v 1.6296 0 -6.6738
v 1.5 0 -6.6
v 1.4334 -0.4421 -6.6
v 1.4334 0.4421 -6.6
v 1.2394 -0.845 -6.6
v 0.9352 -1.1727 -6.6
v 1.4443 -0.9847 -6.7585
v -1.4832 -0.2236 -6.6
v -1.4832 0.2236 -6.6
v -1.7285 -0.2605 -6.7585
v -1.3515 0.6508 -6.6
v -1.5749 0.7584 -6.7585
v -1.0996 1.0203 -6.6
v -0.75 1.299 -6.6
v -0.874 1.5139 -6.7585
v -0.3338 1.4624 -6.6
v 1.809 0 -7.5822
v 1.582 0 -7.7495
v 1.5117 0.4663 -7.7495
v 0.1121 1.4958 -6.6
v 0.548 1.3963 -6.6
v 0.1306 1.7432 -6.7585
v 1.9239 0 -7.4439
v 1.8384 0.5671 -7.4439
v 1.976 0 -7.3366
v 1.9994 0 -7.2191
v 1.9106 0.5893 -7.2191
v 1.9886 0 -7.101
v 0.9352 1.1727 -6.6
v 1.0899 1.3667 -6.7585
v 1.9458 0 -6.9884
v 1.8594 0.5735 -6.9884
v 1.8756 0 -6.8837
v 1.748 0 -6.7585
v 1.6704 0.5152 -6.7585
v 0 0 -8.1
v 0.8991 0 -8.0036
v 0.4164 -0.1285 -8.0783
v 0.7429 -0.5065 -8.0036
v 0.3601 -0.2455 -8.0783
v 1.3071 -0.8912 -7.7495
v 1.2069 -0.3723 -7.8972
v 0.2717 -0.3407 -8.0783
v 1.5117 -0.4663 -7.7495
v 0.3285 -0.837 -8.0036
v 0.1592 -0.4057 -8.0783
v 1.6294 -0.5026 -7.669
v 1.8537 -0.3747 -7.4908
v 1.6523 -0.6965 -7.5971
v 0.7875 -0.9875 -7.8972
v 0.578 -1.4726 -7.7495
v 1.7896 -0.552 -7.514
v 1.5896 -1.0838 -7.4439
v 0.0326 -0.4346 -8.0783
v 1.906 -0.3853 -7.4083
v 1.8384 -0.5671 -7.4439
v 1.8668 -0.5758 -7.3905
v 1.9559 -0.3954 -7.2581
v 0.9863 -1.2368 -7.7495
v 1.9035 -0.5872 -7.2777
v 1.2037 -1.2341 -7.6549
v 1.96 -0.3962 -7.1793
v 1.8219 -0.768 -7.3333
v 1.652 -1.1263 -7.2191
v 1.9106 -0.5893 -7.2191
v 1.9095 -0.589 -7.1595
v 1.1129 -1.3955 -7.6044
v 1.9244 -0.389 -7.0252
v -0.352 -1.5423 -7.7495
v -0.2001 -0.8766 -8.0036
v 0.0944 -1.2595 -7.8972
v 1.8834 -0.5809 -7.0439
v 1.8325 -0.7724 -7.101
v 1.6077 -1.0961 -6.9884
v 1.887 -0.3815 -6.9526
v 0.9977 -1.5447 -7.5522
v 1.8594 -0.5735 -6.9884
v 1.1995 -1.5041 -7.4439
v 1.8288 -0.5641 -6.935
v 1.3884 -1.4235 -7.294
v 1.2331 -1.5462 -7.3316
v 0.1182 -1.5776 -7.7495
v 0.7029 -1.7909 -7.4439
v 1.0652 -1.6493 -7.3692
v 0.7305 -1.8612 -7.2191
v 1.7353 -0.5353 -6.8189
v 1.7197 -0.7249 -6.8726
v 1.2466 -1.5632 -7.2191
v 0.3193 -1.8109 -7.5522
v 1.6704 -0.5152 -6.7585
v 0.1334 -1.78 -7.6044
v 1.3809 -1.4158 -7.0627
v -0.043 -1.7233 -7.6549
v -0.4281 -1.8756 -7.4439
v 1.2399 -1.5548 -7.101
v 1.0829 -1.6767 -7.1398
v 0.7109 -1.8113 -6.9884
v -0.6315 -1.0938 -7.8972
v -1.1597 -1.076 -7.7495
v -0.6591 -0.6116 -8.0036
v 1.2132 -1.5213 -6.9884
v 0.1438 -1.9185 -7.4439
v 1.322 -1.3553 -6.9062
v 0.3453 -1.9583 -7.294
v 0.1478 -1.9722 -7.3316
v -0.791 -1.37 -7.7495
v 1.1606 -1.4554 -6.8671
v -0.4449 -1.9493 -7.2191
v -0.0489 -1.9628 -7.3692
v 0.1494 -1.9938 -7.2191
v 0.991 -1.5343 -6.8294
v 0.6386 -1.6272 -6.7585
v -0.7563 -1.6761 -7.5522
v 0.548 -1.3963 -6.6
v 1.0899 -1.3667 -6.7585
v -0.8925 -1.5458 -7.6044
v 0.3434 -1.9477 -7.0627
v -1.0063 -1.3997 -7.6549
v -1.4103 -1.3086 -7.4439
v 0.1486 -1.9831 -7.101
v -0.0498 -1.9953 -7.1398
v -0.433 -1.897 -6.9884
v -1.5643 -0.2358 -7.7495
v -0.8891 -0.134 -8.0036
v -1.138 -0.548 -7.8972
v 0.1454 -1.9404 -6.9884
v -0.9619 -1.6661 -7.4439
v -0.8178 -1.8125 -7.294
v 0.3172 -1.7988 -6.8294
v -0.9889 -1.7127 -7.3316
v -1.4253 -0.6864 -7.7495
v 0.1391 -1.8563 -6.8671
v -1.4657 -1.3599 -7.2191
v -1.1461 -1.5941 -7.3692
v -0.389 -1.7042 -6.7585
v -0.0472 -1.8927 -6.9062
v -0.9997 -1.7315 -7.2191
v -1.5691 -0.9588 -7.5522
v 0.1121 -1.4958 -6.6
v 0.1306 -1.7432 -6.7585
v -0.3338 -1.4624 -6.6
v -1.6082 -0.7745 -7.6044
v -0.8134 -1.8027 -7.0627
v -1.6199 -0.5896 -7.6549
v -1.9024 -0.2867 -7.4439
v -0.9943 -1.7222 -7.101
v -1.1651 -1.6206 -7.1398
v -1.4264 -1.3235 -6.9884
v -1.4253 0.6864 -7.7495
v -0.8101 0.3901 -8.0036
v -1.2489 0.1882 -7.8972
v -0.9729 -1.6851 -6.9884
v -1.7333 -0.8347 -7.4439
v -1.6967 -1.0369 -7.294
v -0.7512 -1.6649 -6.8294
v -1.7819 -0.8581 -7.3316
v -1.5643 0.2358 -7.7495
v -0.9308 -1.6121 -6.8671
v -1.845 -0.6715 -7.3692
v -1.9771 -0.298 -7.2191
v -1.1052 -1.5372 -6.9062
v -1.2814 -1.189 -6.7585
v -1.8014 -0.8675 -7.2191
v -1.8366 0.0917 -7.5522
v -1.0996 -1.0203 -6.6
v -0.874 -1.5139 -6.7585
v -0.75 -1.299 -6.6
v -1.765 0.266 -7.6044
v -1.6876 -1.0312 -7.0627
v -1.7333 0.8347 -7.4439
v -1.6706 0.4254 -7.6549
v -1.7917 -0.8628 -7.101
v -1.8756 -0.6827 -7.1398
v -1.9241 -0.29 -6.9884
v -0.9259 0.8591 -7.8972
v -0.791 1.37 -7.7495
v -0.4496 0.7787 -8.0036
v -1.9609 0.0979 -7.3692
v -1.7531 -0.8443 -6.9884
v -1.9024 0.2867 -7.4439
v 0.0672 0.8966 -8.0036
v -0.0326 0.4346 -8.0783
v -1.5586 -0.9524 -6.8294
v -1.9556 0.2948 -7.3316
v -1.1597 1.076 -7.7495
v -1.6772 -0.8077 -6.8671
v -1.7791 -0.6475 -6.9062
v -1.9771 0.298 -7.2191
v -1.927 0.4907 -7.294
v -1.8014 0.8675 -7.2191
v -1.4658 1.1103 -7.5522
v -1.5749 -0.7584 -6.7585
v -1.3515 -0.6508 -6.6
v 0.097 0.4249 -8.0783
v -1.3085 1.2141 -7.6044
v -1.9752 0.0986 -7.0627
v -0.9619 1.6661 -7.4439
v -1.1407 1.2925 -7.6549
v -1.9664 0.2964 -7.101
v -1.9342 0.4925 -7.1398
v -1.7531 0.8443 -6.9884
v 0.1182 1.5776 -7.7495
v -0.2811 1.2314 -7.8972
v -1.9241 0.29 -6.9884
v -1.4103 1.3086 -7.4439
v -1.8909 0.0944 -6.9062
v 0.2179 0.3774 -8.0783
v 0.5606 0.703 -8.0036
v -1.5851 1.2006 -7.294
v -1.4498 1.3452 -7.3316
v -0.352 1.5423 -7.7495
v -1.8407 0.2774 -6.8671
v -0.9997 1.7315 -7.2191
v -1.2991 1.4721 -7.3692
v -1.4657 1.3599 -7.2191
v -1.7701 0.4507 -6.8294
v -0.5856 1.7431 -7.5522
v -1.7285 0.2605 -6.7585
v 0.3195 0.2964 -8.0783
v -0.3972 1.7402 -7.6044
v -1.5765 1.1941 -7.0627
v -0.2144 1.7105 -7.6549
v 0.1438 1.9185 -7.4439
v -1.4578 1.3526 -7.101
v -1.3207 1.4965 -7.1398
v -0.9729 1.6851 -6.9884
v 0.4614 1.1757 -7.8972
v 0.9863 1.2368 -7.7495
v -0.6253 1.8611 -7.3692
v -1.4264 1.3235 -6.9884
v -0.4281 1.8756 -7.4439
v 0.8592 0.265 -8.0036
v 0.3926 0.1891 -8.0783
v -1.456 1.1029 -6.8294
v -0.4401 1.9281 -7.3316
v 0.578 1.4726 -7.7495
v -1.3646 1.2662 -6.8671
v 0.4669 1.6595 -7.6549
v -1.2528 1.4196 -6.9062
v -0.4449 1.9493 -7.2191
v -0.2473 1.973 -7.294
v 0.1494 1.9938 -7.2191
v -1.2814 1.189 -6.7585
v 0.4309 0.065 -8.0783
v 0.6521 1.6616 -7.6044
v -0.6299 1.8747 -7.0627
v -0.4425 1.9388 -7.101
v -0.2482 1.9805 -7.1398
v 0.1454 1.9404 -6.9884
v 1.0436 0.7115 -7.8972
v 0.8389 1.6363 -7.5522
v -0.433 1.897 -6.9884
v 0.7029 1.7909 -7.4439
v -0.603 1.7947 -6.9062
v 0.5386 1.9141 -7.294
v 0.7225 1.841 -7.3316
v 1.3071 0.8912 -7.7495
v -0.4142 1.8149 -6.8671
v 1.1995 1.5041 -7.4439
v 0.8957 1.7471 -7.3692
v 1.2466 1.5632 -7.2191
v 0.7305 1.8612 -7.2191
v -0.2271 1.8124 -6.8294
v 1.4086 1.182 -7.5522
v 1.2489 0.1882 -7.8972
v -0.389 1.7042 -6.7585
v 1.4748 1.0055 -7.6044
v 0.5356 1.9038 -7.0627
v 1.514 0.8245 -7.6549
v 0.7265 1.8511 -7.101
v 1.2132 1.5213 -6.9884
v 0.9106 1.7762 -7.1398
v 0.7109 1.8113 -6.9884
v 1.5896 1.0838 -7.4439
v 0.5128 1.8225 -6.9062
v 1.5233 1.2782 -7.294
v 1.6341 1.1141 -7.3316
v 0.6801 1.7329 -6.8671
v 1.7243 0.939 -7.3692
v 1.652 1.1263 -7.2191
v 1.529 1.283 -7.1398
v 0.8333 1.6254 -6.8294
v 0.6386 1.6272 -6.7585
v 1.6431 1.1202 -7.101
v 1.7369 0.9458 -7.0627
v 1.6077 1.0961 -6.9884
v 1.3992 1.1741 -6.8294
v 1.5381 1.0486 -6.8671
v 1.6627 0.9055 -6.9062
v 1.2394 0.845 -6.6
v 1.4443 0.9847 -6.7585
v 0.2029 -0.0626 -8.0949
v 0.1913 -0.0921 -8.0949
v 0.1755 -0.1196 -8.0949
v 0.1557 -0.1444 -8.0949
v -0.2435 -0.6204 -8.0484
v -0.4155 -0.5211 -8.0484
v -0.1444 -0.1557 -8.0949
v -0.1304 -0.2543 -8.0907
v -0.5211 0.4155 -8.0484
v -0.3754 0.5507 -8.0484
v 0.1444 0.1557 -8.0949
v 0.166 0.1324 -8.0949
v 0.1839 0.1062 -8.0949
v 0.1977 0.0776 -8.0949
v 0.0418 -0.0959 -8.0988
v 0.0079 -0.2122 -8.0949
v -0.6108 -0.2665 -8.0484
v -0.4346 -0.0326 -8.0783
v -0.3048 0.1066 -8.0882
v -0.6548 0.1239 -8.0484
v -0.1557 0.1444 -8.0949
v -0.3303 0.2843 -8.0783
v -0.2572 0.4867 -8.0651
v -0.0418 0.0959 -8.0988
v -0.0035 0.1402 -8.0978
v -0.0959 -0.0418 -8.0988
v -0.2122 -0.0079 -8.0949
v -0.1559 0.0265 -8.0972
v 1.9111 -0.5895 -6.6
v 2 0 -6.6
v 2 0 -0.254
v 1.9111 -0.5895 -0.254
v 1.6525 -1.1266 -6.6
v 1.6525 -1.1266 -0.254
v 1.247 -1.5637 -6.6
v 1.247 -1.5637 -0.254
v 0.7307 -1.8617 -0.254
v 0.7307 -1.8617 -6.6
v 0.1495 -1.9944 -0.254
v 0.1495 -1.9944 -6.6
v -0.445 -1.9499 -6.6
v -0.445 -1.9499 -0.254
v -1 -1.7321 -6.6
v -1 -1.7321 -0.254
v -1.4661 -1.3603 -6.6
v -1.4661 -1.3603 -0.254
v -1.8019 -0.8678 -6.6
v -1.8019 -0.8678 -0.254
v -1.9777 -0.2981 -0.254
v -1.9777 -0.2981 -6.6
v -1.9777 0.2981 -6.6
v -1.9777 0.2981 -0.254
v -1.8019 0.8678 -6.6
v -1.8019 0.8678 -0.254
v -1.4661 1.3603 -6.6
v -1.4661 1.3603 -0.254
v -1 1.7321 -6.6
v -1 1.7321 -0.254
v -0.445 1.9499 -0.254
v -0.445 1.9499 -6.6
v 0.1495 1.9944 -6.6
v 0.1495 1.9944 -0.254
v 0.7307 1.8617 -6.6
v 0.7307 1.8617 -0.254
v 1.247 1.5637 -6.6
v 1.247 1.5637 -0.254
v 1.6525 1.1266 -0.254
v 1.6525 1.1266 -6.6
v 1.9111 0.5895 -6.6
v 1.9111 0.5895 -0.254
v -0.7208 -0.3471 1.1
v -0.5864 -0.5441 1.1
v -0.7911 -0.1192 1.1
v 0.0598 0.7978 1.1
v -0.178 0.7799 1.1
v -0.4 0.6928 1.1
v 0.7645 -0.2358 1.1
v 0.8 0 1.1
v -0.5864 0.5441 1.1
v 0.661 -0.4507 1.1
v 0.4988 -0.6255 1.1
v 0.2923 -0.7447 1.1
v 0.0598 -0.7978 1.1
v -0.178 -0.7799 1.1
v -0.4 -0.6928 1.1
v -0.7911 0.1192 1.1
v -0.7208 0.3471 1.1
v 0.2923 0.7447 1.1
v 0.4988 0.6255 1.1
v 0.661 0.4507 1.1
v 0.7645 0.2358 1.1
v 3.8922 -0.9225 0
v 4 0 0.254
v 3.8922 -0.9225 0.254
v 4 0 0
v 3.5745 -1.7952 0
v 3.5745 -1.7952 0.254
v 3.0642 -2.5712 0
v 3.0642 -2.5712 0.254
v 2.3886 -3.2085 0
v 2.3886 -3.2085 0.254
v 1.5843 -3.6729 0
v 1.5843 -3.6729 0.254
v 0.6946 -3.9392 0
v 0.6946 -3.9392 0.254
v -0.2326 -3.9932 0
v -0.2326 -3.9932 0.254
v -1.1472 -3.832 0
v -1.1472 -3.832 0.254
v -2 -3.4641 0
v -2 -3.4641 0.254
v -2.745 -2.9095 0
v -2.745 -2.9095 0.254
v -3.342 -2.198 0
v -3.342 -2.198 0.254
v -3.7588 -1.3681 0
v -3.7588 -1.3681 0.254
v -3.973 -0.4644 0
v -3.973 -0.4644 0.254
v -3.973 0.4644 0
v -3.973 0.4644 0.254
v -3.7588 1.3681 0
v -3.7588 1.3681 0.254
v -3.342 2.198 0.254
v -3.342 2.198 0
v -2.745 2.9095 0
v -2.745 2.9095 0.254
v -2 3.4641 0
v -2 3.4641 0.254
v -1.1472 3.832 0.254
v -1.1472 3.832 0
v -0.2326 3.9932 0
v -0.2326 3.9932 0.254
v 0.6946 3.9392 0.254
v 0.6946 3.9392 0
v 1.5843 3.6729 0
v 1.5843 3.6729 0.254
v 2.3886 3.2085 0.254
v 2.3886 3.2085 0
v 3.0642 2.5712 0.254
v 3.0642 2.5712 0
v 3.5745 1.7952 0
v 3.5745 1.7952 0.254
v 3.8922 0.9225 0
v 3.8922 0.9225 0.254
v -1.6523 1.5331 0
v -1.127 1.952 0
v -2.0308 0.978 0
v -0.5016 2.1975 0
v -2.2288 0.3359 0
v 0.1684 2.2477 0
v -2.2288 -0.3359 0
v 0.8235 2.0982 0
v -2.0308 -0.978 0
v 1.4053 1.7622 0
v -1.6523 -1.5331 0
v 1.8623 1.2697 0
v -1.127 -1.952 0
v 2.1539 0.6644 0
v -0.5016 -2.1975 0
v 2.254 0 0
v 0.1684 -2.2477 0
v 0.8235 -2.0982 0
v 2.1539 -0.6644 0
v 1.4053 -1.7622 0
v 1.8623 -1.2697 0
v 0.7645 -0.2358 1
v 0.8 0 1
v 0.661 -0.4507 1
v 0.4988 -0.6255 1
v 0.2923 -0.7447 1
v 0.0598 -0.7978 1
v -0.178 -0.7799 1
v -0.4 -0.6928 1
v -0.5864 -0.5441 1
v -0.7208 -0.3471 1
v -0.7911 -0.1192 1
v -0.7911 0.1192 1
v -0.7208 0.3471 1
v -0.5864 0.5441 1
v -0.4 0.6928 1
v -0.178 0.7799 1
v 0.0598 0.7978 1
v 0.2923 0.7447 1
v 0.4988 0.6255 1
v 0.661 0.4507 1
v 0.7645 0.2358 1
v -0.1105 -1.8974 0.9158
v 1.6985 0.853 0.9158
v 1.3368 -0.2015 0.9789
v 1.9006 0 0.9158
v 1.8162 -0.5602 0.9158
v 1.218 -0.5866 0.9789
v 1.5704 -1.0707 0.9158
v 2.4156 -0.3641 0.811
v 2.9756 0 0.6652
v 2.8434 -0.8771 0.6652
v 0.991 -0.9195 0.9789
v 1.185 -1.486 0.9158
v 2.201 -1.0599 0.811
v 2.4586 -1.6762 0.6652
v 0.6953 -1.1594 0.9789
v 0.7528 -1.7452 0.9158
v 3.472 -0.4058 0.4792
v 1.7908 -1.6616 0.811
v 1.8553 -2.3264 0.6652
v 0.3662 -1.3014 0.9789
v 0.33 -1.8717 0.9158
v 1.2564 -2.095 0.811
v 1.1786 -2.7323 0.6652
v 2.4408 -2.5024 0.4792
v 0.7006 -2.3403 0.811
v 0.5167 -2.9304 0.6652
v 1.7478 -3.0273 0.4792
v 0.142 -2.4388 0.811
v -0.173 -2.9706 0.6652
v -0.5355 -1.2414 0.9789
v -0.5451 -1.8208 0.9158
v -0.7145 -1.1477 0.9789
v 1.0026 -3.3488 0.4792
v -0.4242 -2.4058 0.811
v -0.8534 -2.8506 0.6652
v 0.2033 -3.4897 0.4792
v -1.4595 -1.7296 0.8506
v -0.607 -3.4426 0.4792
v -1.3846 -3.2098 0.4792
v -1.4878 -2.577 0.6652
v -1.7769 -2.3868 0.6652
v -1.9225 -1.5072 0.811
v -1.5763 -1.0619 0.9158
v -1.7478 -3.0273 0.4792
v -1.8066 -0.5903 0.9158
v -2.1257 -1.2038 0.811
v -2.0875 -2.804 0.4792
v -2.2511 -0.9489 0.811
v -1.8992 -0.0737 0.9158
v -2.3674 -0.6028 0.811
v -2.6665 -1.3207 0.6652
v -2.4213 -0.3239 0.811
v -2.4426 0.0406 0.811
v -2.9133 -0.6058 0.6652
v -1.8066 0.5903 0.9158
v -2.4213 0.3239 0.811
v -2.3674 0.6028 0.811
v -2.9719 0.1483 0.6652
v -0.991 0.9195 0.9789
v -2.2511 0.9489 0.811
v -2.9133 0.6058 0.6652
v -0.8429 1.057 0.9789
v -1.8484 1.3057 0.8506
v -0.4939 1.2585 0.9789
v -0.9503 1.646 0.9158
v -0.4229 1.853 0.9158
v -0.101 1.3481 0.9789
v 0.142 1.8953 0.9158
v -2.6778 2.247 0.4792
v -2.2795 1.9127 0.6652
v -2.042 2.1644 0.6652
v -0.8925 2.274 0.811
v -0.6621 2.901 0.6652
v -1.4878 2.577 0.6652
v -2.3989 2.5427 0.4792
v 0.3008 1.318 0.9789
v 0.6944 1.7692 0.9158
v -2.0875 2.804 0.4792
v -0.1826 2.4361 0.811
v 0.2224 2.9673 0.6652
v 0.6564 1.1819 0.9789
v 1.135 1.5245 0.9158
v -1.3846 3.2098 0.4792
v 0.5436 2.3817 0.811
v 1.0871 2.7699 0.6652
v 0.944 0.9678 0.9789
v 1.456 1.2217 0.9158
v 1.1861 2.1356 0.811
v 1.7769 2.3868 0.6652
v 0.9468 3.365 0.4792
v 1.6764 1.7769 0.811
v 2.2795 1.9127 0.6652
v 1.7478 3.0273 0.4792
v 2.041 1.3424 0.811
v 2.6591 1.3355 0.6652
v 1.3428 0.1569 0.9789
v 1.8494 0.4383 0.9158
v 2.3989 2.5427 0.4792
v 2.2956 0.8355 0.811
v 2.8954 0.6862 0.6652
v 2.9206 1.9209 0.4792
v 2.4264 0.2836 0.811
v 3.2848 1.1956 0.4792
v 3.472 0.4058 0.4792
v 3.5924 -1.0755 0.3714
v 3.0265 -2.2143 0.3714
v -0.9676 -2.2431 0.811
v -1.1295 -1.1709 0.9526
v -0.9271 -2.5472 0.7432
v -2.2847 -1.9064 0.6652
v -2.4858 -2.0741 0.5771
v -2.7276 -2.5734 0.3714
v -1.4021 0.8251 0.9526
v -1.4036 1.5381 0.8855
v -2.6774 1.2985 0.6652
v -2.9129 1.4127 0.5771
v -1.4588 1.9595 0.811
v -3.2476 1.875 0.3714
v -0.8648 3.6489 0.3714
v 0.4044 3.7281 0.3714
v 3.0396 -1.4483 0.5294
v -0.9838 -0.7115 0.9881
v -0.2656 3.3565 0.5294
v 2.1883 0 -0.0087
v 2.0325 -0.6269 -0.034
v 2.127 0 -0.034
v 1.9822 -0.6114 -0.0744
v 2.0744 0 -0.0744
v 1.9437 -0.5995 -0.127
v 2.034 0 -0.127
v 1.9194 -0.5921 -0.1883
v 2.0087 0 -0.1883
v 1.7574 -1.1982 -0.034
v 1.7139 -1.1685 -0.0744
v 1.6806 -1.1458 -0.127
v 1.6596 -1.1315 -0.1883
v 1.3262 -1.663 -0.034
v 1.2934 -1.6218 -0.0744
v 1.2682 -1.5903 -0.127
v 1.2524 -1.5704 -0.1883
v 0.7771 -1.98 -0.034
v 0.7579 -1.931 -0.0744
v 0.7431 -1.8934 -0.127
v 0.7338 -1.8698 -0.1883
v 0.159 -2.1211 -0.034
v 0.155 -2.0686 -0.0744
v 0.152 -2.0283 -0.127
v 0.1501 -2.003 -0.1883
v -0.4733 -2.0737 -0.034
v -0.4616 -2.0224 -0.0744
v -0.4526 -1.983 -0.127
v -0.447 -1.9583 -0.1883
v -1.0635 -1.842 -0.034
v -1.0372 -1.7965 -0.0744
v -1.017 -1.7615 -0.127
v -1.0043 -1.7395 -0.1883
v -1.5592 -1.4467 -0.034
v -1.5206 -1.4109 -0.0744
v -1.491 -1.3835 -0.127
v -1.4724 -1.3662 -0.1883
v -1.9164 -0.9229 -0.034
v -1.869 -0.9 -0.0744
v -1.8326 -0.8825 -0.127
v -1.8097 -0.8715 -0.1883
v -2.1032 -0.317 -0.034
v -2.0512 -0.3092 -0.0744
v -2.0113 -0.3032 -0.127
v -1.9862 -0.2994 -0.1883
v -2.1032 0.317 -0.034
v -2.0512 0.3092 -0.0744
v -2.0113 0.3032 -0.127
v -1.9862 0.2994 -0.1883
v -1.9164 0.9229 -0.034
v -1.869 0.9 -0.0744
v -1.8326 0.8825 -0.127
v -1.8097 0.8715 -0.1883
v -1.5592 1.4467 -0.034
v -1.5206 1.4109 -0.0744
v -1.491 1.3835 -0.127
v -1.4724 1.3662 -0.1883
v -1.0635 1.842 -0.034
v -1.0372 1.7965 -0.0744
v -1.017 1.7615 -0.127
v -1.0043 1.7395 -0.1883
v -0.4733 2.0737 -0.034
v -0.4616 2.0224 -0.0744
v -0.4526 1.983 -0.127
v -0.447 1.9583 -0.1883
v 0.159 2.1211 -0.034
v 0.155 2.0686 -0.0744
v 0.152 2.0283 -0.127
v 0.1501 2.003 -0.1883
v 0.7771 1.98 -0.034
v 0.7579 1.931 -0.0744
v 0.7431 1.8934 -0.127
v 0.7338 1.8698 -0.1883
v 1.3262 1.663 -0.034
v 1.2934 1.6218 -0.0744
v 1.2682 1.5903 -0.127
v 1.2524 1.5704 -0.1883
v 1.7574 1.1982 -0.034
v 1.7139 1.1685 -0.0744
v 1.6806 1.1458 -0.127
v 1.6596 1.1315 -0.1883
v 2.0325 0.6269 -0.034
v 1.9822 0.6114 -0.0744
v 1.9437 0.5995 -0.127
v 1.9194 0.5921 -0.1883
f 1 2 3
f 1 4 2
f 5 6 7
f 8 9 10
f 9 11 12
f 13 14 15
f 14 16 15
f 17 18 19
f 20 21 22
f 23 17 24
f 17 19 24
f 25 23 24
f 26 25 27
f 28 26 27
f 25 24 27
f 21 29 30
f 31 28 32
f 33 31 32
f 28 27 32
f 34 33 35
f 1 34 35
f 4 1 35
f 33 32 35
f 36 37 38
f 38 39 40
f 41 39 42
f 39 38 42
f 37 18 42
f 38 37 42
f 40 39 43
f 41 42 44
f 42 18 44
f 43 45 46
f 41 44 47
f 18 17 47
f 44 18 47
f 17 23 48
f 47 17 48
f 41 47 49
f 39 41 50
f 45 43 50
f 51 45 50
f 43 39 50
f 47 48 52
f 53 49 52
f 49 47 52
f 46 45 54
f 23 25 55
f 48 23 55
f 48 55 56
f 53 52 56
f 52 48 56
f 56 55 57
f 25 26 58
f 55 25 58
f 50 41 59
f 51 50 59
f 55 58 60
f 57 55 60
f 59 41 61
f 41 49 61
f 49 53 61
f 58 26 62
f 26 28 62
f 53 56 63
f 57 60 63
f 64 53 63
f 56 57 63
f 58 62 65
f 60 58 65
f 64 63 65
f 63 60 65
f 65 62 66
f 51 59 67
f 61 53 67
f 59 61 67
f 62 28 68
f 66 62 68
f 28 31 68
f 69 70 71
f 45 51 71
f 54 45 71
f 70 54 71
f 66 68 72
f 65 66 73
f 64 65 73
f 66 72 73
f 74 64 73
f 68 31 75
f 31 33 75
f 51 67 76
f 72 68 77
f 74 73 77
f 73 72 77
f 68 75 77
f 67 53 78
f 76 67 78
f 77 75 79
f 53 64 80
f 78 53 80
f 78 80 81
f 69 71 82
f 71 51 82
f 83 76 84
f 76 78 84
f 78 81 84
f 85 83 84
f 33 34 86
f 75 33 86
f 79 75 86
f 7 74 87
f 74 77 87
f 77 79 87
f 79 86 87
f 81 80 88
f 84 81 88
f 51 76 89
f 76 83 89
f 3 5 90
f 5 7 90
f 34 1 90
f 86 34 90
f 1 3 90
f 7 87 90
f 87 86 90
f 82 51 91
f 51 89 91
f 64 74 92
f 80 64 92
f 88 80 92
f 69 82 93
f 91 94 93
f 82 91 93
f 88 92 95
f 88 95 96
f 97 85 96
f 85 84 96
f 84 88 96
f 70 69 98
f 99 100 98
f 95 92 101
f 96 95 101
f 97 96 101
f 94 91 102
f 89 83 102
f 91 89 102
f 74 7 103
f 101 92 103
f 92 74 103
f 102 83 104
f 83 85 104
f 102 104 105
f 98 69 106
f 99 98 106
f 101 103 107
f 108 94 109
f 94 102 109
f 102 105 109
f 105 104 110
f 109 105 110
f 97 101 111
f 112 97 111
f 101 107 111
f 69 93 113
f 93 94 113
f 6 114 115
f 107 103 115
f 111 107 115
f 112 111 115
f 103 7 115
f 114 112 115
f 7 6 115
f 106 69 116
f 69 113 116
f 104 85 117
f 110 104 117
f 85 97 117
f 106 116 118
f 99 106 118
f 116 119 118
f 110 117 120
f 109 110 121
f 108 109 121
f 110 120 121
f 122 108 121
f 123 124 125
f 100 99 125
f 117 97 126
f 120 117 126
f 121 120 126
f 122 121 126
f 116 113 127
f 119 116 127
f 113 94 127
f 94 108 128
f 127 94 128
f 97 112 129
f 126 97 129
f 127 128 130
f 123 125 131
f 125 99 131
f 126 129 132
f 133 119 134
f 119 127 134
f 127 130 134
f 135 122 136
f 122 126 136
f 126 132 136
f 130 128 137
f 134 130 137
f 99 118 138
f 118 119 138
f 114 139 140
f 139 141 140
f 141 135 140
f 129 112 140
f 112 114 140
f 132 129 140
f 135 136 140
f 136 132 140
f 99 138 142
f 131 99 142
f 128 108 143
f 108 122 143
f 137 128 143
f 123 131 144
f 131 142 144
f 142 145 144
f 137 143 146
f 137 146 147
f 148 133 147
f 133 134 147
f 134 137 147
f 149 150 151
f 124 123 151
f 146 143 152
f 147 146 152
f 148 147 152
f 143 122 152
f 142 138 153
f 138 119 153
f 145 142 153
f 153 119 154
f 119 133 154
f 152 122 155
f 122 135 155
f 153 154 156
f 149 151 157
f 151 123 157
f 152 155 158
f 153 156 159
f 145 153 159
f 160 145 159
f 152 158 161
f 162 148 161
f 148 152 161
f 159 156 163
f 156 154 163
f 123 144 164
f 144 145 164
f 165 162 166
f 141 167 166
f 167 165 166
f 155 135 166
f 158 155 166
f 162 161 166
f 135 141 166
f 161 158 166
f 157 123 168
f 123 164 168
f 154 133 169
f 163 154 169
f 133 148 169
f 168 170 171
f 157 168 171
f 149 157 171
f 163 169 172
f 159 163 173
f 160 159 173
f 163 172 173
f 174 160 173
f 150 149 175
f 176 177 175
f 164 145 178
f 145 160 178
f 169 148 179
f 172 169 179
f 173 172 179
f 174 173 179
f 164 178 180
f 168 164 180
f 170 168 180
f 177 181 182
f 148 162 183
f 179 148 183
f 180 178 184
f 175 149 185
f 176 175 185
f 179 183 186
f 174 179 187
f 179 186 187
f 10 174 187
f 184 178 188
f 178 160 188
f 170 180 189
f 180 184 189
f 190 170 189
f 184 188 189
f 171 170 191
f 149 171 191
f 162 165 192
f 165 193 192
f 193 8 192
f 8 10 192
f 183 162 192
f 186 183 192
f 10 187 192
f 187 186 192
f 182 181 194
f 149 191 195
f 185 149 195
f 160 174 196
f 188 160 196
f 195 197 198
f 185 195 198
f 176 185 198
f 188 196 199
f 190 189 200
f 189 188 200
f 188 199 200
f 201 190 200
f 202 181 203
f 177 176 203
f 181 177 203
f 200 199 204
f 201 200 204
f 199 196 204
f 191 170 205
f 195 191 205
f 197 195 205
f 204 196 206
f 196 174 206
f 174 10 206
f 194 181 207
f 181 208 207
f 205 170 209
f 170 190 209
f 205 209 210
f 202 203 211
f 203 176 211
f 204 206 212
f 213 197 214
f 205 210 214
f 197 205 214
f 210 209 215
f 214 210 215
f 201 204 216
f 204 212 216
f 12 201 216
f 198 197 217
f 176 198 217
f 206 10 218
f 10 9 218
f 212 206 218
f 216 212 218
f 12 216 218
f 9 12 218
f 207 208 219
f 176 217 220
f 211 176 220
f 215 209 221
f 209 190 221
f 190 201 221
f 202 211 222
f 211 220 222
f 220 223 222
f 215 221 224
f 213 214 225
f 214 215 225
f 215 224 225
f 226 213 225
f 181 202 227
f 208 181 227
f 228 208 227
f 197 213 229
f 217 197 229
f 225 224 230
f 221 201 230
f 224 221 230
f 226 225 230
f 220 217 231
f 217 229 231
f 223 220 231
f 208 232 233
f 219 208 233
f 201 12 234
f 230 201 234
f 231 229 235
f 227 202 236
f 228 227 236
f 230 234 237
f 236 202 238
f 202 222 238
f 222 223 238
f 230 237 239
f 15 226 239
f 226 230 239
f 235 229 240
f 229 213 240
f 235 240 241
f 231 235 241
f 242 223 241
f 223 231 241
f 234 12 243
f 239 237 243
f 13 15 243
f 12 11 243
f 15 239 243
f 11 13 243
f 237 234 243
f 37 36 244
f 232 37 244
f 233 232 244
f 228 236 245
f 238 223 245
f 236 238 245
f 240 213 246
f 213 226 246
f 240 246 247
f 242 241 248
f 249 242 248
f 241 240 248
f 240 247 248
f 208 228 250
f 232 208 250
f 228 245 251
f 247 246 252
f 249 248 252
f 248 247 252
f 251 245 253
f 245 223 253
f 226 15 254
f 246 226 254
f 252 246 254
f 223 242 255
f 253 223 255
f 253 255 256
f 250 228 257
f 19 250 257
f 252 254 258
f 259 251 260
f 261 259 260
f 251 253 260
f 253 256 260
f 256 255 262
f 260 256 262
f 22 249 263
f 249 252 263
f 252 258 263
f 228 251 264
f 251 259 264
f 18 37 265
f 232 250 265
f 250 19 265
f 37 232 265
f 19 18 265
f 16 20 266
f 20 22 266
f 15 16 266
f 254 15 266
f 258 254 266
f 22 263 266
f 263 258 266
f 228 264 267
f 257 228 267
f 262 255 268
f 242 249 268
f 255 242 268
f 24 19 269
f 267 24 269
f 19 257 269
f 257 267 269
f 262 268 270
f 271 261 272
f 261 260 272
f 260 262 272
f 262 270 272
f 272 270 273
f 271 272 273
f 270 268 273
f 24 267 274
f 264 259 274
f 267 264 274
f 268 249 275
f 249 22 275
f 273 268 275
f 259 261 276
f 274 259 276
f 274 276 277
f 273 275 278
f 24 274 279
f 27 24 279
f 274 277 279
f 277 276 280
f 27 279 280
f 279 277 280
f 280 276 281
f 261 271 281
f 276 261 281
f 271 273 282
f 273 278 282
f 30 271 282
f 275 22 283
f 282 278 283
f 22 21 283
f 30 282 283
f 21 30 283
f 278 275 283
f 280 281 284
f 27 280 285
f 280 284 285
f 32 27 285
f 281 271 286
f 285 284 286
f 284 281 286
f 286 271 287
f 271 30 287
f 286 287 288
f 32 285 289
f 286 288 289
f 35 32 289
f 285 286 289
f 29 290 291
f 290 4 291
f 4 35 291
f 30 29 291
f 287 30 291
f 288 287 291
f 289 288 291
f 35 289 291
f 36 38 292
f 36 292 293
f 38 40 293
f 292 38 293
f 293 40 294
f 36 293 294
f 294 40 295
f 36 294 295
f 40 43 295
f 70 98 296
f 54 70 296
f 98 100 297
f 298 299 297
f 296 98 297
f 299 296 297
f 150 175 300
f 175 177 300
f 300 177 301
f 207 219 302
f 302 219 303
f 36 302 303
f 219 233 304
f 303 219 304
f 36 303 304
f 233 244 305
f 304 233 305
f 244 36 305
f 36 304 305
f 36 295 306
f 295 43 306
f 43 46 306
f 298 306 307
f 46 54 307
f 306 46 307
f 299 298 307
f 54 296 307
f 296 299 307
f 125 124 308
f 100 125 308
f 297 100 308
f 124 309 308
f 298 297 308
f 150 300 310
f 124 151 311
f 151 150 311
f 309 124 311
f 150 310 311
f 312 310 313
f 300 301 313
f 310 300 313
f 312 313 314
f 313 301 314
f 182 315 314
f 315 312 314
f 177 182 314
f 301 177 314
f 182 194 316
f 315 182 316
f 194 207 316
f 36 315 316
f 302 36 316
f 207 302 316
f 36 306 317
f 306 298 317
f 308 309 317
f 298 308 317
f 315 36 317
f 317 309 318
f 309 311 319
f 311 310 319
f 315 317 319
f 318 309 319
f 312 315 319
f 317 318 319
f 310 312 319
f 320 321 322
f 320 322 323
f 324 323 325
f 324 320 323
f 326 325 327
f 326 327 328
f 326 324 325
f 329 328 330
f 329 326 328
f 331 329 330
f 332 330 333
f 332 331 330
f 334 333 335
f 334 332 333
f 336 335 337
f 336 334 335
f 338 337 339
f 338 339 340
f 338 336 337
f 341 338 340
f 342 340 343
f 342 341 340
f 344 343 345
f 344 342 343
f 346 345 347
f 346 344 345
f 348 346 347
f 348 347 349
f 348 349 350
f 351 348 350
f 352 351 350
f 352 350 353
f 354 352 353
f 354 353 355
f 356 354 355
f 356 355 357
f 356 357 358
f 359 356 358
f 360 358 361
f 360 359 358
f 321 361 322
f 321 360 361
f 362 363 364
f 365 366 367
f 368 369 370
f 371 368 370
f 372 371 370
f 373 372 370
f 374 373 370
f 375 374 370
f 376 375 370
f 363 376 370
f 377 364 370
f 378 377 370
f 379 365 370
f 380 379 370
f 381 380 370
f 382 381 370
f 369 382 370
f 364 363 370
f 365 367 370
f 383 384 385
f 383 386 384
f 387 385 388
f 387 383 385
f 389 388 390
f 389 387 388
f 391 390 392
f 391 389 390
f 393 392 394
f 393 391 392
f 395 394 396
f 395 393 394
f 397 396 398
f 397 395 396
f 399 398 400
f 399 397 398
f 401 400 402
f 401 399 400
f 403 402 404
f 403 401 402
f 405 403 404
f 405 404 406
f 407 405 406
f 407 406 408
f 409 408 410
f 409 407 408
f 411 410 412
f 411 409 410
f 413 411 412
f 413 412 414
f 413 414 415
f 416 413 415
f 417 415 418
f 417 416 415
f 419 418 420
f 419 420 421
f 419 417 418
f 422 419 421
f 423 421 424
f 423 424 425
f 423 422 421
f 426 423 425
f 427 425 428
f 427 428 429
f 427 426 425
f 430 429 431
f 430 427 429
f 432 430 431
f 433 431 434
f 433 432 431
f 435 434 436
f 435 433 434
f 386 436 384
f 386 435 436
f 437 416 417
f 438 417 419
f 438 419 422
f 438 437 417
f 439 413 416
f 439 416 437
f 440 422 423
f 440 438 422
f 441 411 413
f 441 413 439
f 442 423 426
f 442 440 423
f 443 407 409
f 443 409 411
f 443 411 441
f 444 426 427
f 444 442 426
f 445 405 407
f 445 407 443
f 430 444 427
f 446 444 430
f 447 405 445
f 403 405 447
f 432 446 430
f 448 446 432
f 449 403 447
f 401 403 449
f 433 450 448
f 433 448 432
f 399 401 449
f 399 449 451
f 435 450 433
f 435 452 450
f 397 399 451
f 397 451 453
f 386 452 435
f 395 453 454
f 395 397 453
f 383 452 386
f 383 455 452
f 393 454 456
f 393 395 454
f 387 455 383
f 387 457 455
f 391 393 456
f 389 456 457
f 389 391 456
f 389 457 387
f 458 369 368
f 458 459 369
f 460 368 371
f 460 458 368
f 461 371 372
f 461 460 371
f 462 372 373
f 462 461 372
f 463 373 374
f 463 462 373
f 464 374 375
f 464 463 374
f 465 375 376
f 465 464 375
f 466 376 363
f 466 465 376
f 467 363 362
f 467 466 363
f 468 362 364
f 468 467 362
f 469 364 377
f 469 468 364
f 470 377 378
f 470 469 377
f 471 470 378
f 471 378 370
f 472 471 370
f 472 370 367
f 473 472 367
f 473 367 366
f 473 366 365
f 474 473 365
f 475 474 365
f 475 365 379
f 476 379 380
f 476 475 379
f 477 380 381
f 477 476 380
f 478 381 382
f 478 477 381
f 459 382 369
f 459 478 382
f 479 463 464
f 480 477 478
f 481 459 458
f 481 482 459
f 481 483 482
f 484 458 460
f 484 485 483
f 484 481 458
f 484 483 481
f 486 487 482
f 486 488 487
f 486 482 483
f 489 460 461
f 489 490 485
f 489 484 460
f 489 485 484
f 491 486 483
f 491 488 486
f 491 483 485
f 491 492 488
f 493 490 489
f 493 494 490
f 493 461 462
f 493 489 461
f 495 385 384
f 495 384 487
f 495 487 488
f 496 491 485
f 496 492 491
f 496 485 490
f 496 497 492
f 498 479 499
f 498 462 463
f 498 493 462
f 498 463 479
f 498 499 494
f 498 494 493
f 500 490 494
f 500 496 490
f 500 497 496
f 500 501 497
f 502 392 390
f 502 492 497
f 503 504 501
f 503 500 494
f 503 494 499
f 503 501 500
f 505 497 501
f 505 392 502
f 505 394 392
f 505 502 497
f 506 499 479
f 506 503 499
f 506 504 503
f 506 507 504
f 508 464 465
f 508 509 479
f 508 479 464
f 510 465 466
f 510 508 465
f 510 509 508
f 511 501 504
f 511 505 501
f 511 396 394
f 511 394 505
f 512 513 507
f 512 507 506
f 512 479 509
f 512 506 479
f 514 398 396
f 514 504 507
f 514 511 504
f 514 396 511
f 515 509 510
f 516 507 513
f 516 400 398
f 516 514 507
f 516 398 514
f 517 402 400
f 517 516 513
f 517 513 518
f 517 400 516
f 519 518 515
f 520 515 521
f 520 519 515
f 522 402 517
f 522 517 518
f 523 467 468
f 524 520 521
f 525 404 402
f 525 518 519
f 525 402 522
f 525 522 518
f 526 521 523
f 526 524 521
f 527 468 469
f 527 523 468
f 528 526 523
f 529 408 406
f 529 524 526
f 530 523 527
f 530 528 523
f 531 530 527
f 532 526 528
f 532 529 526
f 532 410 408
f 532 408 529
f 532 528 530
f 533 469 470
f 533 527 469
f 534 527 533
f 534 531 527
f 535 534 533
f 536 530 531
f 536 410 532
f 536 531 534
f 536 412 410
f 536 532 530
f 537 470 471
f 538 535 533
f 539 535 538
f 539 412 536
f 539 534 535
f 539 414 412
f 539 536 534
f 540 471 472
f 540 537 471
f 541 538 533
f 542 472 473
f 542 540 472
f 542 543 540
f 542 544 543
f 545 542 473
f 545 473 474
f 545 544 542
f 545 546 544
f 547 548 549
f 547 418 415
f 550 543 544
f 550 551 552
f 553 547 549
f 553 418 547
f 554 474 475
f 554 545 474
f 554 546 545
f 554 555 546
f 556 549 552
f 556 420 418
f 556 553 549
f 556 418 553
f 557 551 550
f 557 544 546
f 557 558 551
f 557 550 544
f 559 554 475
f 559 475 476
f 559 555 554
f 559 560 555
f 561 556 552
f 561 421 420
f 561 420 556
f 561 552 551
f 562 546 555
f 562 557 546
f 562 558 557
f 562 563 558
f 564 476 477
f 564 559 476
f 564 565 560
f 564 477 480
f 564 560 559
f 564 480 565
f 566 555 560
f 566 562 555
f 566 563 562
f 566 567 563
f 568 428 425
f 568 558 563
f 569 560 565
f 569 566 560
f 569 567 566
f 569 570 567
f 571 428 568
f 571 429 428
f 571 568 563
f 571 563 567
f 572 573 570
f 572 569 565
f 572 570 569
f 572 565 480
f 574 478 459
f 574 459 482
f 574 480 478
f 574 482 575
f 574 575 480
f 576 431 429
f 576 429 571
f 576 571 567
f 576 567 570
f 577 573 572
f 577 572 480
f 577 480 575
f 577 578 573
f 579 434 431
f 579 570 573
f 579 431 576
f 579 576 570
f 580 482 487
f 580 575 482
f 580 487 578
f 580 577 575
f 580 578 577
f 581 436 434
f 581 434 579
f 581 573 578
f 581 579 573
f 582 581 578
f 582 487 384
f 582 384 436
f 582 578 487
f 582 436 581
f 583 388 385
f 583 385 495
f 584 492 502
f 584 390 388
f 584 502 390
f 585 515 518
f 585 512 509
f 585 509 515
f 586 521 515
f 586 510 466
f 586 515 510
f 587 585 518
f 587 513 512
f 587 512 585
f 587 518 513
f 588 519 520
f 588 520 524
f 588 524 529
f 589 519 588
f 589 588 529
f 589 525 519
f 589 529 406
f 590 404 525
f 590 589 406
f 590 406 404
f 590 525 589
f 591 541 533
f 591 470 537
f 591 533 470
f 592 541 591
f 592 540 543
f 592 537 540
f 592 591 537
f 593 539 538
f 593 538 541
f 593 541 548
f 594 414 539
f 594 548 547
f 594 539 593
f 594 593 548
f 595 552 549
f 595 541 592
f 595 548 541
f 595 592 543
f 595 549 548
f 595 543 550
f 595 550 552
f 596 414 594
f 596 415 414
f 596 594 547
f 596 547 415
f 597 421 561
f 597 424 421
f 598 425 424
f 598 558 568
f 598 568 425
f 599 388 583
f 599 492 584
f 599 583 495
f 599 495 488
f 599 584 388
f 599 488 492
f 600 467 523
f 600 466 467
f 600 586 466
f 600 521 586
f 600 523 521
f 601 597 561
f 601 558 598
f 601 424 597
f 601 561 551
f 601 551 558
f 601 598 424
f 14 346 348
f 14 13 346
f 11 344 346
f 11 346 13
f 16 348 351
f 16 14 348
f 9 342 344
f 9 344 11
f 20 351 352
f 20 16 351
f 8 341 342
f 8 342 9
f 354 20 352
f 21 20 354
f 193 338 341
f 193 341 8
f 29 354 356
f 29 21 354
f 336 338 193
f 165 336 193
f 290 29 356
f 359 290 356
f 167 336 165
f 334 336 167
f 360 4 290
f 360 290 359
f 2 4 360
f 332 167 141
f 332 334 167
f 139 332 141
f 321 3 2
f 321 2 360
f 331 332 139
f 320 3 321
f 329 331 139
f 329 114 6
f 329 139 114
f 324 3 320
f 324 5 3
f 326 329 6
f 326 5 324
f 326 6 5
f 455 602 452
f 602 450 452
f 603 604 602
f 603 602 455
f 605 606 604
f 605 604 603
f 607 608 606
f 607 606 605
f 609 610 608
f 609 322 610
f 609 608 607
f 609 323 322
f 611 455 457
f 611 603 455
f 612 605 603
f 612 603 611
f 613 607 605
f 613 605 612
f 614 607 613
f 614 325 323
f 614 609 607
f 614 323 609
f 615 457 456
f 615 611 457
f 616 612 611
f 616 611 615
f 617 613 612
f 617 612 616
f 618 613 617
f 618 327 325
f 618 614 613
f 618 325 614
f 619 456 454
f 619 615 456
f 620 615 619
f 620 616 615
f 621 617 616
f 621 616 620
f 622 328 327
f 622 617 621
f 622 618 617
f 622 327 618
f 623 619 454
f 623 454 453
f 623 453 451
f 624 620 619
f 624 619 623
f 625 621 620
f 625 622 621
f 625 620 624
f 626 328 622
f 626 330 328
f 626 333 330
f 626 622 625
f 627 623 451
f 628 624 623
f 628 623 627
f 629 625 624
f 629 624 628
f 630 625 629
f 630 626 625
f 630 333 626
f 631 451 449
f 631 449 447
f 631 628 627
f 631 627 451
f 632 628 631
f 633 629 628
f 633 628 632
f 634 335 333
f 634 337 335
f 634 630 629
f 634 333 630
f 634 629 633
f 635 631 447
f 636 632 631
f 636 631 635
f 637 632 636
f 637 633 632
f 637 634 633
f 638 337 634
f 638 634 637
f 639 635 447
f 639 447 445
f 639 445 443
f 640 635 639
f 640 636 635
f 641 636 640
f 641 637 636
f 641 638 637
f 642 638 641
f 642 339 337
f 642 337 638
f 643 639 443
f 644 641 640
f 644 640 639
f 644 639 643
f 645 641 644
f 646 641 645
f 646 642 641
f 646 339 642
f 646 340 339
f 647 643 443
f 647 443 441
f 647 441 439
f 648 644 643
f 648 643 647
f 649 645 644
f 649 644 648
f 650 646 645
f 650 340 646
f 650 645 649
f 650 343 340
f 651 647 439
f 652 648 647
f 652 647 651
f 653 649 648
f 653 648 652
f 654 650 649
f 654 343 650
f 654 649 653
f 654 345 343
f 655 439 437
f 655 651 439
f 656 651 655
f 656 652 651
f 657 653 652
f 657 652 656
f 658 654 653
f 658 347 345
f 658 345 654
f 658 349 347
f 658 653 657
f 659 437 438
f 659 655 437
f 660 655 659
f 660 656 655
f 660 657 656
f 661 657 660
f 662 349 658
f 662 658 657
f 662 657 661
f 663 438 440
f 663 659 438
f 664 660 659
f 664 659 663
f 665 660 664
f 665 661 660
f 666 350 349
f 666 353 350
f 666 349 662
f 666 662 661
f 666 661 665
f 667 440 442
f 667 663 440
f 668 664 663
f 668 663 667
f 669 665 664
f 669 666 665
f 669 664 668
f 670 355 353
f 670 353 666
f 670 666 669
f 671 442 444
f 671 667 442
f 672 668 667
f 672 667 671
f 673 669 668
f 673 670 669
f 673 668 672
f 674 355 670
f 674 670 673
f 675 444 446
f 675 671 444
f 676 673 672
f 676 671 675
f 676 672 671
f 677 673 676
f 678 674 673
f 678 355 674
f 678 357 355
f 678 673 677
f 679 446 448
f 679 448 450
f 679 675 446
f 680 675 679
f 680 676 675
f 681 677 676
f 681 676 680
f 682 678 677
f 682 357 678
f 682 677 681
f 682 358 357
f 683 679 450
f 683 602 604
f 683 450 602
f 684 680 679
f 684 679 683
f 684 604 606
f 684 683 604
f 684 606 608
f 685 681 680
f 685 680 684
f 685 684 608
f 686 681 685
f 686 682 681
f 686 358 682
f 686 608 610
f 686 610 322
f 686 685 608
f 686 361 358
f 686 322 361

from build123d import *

# Parameters (mm, degrees)
CUT_EXTRUDE1_DEPTH      = 13.280472369
CUT_EXTRUDE1_DEPTH_BACK = 13.280472369
CUT_EXTRUDE2_DEPTH      = 13.280472369
CUT_EXTRUDE2_DEPTH_BACK = 13.280472369
FILLET2_R               = 0.254
SKETCH5_R               = 1.211430269
CUT_EXTRUDE3_DEPTH      = 10


with BuildPart() as part:
    # Sketch2 → Revolve1 (revolve)
    with BuildSketch(Plane(origin=(0, 0, 0), x_dir=(0, 0, -1), z_dir=(1, 0, 0)), mode=Mode.PRIVATE) as revolve1_sk:
        with BuildLine():
            Line((-10.9, 0), (-10.9, 0.8))
            Line((-10.9, 0.8), (-1, 0.8))
            ThreePointArc((-1, 0.8), (-0.811032662, 2.442902614), (-0.254, 4))
            Line((-0.254, 4), (0, 4))
            Line((0, 4), (0, 2))
            Line((0, 2), (6.6, 2))
            Line((6.6, 2), (6.6, 1.5))
            add(Edge.make_bspline(
                [(8.1, 0), (8.1, 4.430500874), (6.6, 1.5)],
                knots=[4.71238898, 4.71238898, 4.71238898, 7.005919555, 7.005919555, 7.005919555], degree=2, weights=[1, 0.411437828, 1]))
            Line((8.1, 0), (6.6, 0))
            Line((6.6, 0), (-10.9, 0))
        make_face()
    revolve(revolve1_sk.sketch.rotate(Axis((0, 0, 10.9), (0, 0, -1)), 90), axis=Axis((0, 0, 10.9), (0, 0, -1)))

    # Sketch3 → Cut-Extrude1 (cut, two sides: drawn at the far end of the back side and taken through both)
    with BuildSketch(Plane(origin=(0, 0, 0), x_dir=(1, 0, 0), z_dir=(0, 1, 0)).offset(-CUT_EXTRUDE1_DEPTH_BACK)):
        Polygon((0, -10.9), (1.0032, -9.592604306), (1.0032, -11.408), (-1.0032, -11.408), (-1.0032, -9.592604306), align=None)
    extrude(amount=CUT_EXTRUDE1_DEPTH + CUT_EXTRUDE1_DEPTH_BACK, mode=Mode.SUBTRACT)

    # Sketch4 → Cut-Extrude2 (cut, two sides: drawn at the far end of the back side and taken through both)
    with BuildSketch(Plane(origin=(0, 0, 0), x_dir=(0, 0, -1), z_dir=(1, 0, 0)).offset(-CUT_EXTRUDE2_DEPTH_BACK)):
        Polygon((-11.154, 0), (-9.846, 1.308), (-11.408, 1.308), (-11.408, -1.308), (-9.846, -1.308), align=None)
    extrude(amount=CUT_EXTRUDE2_DEPTH + CUT_EXTRUDE2_DEPTH_BACK, mode=Mode.SUBTRACT)

    # Fillet2
    fillet2_edges = [part.edges().sort_by_distance(p)[0] for p in [
        (-2, 0, 0),
    ]]
    fillet(fillet2_edges, radius=FILLET2_R)

    # Sketch5 → Cut-Extrude3 (cut)
    with BuildSketch(Plane(origin=(0, 0, 1.1), x_dir=(-1, 0, 0), z_dir=(0, 0, -1))):
        Circle(SKETCH5_R)
    extrude(amount=-CUT_EXTRUDE3_DEPTH, mode=Mode.SUBTRACT)


solid = part.part
